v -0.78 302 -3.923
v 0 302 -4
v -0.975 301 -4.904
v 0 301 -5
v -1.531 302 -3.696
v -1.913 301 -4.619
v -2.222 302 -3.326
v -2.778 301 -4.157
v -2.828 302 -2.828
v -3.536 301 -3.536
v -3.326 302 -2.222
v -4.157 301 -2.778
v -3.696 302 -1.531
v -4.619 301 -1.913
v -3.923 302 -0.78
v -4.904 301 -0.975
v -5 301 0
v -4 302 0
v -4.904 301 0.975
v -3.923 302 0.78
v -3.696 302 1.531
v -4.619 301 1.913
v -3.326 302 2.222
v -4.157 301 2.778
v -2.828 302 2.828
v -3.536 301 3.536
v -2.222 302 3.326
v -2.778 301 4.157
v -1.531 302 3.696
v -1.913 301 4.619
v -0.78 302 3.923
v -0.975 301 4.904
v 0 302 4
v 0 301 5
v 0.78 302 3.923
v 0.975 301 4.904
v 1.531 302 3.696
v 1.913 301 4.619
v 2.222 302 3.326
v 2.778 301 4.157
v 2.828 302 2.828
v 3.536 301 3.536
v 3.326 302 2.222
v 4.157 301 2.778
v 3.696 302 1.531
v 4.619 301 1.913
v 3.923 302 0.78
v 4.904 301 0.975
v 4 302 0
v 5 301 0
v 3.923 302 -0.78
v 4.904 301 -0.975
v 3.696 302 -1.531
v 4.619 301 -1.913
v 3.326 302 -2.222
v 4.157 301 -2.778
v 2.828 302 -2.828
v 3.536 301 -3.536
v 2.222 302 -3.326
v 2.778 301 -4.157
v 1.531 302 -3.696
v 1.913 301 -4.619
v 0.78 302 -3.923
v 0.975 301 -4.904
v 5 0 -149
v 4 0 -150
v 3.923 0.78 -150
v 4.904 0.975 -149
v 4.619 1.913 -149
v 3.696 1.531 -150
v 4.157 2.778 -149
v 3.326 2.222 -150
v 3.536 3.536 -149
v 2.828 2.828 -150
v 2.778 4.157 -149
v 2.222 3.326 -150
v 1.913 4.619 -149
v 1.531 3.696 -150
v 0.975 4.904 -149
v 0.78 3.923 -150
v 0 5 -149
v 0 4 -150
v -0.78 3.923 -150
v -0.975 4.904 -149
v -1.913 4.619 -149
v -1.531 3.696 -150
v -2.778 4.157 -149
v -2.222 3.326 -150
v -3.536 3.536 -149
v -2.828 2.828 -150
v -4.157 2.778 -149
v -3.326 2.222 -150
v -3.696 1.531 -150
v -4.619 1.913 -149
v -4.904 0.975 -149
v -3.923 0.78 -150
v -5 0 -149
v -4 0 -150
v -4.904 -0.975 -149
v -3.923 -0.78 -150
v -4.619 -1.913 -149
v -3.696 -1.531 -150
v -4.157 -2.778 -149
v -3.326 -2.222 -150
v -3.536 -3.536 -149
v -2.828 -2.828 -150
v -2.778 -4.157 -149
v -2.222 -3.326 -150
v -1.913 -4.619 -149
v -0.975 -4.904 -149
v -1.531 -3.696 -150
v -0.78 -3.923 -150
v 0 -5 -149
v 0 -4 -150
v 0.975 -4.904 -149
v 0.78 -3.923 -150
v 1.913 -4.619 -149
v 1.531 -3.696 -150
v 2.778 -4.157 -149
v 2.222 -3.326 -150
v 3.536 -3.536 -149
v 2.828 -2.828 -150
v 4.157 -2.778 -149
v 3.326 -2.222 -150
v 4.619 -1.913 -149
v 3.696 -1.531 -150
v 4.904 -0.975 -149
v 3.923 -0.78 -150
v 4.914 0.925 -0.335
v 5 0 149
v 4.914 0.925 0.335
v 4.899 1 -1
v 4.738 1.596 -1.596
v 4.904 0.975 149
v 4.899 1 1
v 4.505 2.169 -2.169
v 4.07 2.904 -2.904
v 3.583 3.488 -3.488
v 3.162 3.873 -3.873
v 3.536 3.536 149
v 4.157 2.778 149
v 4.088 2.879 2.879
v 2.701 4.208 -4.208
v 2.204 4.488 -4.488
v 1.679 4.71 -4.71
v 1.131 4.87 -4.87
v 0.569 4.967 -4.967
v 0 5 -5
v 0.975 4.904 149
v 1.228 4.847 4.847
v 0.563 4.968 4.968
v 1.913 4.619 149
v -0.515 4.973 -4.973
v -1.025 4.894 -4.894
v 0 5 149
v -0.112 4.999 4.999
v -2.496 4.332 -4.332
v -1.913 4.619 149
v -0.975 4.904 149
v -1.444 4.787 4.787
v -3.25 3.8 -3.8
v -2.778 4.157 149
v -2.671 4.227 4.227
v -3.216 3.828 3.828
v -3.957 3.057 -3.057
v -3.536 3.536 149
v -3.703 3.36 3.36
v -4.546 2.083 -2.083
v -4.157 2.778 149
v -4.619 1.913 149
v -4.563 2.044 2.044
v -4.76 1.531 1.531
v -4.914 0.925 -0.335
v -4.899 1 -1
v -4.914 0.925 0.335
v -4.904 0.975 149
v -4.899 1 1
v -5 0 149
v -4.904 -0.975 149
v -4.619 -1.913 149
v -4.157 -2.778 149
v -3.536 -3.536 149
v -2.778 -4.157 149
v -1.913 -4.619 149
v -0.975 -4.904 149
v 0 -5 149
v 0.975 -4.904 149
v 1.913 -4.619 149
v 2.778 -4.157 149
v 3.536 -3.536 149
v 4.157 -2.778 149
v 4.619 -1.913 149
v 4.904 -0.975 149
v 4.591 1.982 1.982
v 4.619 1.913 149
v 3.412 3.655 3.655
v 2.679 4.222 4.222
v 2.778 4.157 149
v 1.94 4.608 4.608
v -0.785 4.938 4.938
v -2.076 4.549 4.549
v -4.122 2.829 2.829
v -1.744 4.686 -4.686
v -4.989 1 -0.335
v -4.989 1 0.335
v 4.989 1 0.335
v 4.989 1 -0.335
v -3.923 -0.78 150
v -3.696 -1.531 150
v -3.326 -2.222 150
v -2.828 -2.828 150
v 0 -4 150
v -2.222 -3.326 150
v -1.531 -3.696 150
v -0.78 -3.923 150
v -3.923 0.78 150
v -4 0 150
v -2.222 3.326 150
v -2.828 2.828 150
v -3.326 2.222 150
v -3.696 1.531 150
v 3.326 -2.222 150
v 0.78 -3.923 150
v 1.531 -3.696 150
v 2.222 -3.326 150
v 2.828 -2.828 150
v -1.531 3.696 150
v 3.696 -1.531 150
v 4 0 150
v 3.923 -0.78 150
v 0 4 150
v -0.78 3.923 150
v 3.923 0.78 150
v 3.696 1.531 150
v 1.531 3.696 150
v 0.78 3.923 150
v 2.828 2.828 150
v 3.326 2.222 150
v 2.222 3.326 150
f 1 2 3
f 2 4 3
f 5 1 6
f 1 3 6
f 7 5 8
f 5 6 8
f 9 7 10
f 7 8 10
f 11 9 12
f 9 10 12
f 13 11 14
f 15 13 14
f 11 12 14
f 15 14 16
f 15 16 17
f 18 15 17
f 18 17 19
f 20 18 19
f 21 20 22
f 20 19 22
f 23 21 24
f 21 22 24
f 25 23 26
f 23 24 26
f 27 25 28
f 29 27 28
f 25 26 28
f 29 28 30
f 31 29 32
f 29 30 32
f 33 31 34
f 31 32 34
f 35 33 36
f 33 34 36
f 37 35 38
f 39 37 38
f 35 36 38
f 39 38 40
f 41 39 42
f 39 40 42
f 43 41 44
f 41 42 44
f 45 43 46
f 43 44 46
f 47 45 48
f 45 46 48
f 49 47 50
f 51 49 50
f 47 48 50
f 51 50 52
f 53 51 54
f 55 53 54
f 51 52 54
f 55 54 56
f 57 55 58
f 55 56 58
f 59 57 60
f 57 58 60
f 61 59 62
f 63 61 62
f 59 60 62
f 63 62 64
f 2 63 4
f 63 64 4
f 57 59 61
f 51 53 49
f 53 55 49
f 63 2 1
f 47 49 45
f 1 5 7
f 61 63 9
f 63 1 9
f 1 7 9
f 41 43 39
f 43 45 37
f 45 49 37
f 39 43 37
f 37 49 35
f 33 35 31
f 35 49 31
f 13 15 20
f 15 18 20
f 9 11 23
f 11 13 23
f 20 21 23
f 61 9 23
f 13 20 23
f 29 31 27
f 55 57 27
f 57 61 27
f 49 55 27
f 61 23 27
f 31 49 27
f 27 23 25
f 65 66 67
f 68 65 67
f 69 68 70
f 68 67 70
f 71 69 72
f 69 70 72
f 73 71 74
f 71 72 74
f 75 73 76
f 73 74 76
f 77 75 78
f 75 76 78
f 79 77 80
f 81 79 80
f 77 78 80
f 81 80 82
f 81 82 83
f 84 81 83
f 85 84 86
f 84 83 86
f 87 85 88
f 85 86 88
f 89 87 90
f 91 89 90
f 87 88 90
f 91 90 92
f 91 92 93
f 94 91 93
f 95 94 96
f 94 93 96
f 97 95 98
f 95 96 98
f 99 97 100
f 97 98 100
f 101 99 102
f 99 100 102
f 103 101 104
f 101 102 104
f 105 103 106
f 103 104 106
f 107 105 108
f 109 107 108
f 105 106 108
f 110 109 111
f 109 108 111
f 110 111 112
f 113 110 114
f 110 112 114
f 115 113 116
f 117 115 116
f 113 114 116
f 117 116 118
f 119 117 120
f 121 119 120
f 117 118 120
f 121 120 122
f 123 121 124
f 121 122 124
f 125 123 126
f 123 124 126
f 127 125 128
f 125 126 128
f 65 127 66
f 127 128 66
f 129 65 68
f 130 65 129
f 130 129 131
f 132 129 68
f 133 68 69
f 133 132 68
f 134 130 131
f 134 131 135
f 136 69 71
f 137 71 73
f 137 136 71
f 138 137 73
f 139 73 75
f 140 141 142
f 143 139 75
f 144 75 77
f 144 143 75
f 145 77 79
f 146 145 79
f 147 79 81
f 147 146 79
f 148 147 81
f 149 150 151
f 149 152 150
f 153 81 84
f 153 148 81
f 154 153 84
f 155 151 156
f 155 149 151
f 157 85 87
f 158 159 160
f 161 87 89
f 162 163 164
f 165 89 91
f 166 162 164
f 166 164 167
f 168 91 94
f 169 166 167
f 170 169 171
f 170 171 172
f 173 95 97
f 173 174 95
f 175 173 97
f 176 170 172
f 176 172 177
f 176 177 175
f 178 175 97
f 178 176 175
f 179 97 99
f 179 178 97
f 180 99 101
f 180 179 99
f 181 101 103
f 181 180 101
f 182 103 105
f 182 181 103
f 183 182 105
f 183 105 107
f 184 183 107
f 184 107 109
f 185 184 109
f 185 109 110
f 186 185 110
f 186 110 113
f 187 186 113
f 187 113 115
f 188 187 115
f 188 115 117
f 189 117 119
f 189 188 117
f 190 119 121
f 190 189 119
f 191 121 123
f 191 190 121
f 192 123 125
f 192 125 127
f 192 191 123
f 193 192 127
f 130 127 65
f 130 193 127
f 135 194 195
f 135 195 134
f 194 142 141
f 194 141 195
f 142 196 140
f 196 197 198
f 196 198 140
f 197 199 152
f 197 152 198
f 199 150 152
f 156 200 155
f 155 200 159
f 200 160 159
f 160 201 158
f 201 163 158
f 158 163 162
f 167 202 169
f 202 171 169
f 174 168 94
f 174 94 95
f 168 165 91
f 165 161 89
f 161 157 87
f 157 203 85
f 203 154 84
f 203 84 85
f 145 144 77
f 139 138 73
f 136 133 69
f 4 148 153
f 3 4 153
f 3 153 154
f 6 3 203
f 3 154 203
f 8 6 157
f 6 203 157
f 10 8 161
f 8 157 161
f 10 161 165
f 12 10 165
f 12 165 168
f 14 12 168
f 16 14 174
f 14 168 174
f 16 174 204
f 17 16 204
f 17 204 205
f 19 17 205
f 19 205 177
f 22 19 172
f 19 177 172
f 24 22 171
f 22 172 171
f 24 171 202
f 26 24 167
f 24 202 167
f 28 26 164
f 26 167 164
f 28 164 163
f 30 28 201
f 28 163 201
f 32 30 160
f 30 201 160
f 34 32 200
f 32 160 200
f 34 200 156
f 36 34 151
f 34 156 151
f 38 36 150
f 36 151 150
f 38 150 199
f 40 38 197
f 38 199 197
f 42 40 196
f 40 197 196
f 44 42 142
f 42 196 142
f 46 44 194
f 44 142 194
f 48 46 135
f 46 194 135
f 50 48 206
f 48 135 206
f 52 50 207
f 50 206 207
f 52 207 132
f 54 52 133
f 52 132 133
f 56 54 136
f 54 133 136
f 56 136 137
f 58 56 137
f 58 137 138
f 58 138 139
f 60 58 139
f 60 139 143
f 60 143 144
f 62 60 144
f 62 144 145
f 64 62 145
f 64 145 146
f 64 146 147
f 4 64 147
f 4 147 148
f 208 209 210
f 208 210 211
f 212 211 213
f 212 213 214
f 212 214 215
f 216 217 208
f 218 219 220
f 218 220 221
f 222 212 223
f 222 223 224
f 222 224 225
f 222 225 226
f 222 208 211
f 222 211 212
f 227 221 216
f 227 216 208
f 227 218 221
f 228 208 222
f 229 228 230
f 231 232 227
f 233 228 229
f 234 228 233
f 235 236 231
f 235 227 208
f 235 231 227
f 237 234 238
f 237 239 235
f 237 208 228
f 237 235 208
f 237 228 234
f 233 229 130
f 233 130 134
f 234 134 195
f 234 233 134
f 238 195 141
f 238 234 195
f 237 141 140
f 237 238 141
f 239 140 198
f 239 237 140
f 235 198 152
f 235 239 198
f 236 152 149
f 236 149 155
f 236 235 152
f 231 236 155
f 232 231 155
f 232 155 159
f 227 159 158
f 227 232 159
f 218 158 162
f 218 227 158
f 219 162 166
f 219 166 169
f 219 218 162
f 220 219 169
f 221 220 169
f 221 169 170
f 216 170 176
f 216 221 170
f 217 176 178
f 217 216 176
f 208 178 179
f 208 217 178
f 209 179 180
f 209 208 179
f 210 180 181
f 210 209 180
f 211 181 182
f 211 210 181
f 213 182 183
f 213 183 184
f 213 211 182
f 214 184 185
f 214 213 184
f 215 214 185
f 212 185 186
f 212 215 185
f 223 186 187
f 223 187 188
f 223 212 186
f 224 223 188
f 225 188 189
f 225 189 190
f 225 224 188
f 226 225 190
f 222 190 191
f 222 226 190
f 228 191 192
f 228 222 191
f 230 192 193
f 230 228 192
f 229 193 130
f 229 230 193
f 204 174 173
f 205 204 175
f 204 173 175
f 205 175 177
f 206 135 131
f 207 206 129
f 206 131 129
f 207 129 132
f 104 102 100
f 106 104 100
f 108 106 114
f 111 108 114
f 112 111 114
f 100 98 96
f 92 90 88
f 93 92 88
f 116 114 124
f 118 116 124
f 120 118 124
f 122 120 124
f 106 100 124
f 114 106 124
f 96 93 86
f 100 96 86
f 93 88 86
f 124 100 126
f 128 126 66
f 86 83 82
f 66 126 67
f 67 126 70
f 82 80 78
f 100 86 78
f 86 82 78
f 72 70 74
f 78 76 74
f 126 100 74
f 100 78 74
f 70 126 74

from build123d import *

# Parameters (mm, degrees)
SKETCH2_R           = 5
BOSS_EXTRUDE1_DEPTH = 150
CHAMFER1_SIZE       = 1


with BuildPart() as part:
    # Sketch1 → Revolve1 (revolve)
    with BuildSketch(Plane.XY, mode=Mode.PRIVATE) as revolve1_sk:
        Polygon((0, 0), (0, 302), (4, 302), (5, 301), (5, 1), (4, 0), align=None)
    revolve(revolve1_sk.sketch.rotate(Axis((0, 0, 0), (0, 1, 0)), 90), axis=Axis((0, 0, 0), (0, 1, 0)))

    # Sketch2 → Boss-Extrude1 (add, symmetric)
    with BuildSketch(Plane.XY):
        Circle(SKETCH2_R)
    extrude(amount=BOSS_EXTRUDE1_DEPTH, both=True)

    # Chamfer1
    chamfer1_edges = [part.edges().sort_by_distance(p)[0] for p in [
        (-5, 0, -150),
        (-5, 0, 150),
    ]]
    chamfer(chamfer1_edges, length=CHAMFER1_SIZE)


solid = part.part
